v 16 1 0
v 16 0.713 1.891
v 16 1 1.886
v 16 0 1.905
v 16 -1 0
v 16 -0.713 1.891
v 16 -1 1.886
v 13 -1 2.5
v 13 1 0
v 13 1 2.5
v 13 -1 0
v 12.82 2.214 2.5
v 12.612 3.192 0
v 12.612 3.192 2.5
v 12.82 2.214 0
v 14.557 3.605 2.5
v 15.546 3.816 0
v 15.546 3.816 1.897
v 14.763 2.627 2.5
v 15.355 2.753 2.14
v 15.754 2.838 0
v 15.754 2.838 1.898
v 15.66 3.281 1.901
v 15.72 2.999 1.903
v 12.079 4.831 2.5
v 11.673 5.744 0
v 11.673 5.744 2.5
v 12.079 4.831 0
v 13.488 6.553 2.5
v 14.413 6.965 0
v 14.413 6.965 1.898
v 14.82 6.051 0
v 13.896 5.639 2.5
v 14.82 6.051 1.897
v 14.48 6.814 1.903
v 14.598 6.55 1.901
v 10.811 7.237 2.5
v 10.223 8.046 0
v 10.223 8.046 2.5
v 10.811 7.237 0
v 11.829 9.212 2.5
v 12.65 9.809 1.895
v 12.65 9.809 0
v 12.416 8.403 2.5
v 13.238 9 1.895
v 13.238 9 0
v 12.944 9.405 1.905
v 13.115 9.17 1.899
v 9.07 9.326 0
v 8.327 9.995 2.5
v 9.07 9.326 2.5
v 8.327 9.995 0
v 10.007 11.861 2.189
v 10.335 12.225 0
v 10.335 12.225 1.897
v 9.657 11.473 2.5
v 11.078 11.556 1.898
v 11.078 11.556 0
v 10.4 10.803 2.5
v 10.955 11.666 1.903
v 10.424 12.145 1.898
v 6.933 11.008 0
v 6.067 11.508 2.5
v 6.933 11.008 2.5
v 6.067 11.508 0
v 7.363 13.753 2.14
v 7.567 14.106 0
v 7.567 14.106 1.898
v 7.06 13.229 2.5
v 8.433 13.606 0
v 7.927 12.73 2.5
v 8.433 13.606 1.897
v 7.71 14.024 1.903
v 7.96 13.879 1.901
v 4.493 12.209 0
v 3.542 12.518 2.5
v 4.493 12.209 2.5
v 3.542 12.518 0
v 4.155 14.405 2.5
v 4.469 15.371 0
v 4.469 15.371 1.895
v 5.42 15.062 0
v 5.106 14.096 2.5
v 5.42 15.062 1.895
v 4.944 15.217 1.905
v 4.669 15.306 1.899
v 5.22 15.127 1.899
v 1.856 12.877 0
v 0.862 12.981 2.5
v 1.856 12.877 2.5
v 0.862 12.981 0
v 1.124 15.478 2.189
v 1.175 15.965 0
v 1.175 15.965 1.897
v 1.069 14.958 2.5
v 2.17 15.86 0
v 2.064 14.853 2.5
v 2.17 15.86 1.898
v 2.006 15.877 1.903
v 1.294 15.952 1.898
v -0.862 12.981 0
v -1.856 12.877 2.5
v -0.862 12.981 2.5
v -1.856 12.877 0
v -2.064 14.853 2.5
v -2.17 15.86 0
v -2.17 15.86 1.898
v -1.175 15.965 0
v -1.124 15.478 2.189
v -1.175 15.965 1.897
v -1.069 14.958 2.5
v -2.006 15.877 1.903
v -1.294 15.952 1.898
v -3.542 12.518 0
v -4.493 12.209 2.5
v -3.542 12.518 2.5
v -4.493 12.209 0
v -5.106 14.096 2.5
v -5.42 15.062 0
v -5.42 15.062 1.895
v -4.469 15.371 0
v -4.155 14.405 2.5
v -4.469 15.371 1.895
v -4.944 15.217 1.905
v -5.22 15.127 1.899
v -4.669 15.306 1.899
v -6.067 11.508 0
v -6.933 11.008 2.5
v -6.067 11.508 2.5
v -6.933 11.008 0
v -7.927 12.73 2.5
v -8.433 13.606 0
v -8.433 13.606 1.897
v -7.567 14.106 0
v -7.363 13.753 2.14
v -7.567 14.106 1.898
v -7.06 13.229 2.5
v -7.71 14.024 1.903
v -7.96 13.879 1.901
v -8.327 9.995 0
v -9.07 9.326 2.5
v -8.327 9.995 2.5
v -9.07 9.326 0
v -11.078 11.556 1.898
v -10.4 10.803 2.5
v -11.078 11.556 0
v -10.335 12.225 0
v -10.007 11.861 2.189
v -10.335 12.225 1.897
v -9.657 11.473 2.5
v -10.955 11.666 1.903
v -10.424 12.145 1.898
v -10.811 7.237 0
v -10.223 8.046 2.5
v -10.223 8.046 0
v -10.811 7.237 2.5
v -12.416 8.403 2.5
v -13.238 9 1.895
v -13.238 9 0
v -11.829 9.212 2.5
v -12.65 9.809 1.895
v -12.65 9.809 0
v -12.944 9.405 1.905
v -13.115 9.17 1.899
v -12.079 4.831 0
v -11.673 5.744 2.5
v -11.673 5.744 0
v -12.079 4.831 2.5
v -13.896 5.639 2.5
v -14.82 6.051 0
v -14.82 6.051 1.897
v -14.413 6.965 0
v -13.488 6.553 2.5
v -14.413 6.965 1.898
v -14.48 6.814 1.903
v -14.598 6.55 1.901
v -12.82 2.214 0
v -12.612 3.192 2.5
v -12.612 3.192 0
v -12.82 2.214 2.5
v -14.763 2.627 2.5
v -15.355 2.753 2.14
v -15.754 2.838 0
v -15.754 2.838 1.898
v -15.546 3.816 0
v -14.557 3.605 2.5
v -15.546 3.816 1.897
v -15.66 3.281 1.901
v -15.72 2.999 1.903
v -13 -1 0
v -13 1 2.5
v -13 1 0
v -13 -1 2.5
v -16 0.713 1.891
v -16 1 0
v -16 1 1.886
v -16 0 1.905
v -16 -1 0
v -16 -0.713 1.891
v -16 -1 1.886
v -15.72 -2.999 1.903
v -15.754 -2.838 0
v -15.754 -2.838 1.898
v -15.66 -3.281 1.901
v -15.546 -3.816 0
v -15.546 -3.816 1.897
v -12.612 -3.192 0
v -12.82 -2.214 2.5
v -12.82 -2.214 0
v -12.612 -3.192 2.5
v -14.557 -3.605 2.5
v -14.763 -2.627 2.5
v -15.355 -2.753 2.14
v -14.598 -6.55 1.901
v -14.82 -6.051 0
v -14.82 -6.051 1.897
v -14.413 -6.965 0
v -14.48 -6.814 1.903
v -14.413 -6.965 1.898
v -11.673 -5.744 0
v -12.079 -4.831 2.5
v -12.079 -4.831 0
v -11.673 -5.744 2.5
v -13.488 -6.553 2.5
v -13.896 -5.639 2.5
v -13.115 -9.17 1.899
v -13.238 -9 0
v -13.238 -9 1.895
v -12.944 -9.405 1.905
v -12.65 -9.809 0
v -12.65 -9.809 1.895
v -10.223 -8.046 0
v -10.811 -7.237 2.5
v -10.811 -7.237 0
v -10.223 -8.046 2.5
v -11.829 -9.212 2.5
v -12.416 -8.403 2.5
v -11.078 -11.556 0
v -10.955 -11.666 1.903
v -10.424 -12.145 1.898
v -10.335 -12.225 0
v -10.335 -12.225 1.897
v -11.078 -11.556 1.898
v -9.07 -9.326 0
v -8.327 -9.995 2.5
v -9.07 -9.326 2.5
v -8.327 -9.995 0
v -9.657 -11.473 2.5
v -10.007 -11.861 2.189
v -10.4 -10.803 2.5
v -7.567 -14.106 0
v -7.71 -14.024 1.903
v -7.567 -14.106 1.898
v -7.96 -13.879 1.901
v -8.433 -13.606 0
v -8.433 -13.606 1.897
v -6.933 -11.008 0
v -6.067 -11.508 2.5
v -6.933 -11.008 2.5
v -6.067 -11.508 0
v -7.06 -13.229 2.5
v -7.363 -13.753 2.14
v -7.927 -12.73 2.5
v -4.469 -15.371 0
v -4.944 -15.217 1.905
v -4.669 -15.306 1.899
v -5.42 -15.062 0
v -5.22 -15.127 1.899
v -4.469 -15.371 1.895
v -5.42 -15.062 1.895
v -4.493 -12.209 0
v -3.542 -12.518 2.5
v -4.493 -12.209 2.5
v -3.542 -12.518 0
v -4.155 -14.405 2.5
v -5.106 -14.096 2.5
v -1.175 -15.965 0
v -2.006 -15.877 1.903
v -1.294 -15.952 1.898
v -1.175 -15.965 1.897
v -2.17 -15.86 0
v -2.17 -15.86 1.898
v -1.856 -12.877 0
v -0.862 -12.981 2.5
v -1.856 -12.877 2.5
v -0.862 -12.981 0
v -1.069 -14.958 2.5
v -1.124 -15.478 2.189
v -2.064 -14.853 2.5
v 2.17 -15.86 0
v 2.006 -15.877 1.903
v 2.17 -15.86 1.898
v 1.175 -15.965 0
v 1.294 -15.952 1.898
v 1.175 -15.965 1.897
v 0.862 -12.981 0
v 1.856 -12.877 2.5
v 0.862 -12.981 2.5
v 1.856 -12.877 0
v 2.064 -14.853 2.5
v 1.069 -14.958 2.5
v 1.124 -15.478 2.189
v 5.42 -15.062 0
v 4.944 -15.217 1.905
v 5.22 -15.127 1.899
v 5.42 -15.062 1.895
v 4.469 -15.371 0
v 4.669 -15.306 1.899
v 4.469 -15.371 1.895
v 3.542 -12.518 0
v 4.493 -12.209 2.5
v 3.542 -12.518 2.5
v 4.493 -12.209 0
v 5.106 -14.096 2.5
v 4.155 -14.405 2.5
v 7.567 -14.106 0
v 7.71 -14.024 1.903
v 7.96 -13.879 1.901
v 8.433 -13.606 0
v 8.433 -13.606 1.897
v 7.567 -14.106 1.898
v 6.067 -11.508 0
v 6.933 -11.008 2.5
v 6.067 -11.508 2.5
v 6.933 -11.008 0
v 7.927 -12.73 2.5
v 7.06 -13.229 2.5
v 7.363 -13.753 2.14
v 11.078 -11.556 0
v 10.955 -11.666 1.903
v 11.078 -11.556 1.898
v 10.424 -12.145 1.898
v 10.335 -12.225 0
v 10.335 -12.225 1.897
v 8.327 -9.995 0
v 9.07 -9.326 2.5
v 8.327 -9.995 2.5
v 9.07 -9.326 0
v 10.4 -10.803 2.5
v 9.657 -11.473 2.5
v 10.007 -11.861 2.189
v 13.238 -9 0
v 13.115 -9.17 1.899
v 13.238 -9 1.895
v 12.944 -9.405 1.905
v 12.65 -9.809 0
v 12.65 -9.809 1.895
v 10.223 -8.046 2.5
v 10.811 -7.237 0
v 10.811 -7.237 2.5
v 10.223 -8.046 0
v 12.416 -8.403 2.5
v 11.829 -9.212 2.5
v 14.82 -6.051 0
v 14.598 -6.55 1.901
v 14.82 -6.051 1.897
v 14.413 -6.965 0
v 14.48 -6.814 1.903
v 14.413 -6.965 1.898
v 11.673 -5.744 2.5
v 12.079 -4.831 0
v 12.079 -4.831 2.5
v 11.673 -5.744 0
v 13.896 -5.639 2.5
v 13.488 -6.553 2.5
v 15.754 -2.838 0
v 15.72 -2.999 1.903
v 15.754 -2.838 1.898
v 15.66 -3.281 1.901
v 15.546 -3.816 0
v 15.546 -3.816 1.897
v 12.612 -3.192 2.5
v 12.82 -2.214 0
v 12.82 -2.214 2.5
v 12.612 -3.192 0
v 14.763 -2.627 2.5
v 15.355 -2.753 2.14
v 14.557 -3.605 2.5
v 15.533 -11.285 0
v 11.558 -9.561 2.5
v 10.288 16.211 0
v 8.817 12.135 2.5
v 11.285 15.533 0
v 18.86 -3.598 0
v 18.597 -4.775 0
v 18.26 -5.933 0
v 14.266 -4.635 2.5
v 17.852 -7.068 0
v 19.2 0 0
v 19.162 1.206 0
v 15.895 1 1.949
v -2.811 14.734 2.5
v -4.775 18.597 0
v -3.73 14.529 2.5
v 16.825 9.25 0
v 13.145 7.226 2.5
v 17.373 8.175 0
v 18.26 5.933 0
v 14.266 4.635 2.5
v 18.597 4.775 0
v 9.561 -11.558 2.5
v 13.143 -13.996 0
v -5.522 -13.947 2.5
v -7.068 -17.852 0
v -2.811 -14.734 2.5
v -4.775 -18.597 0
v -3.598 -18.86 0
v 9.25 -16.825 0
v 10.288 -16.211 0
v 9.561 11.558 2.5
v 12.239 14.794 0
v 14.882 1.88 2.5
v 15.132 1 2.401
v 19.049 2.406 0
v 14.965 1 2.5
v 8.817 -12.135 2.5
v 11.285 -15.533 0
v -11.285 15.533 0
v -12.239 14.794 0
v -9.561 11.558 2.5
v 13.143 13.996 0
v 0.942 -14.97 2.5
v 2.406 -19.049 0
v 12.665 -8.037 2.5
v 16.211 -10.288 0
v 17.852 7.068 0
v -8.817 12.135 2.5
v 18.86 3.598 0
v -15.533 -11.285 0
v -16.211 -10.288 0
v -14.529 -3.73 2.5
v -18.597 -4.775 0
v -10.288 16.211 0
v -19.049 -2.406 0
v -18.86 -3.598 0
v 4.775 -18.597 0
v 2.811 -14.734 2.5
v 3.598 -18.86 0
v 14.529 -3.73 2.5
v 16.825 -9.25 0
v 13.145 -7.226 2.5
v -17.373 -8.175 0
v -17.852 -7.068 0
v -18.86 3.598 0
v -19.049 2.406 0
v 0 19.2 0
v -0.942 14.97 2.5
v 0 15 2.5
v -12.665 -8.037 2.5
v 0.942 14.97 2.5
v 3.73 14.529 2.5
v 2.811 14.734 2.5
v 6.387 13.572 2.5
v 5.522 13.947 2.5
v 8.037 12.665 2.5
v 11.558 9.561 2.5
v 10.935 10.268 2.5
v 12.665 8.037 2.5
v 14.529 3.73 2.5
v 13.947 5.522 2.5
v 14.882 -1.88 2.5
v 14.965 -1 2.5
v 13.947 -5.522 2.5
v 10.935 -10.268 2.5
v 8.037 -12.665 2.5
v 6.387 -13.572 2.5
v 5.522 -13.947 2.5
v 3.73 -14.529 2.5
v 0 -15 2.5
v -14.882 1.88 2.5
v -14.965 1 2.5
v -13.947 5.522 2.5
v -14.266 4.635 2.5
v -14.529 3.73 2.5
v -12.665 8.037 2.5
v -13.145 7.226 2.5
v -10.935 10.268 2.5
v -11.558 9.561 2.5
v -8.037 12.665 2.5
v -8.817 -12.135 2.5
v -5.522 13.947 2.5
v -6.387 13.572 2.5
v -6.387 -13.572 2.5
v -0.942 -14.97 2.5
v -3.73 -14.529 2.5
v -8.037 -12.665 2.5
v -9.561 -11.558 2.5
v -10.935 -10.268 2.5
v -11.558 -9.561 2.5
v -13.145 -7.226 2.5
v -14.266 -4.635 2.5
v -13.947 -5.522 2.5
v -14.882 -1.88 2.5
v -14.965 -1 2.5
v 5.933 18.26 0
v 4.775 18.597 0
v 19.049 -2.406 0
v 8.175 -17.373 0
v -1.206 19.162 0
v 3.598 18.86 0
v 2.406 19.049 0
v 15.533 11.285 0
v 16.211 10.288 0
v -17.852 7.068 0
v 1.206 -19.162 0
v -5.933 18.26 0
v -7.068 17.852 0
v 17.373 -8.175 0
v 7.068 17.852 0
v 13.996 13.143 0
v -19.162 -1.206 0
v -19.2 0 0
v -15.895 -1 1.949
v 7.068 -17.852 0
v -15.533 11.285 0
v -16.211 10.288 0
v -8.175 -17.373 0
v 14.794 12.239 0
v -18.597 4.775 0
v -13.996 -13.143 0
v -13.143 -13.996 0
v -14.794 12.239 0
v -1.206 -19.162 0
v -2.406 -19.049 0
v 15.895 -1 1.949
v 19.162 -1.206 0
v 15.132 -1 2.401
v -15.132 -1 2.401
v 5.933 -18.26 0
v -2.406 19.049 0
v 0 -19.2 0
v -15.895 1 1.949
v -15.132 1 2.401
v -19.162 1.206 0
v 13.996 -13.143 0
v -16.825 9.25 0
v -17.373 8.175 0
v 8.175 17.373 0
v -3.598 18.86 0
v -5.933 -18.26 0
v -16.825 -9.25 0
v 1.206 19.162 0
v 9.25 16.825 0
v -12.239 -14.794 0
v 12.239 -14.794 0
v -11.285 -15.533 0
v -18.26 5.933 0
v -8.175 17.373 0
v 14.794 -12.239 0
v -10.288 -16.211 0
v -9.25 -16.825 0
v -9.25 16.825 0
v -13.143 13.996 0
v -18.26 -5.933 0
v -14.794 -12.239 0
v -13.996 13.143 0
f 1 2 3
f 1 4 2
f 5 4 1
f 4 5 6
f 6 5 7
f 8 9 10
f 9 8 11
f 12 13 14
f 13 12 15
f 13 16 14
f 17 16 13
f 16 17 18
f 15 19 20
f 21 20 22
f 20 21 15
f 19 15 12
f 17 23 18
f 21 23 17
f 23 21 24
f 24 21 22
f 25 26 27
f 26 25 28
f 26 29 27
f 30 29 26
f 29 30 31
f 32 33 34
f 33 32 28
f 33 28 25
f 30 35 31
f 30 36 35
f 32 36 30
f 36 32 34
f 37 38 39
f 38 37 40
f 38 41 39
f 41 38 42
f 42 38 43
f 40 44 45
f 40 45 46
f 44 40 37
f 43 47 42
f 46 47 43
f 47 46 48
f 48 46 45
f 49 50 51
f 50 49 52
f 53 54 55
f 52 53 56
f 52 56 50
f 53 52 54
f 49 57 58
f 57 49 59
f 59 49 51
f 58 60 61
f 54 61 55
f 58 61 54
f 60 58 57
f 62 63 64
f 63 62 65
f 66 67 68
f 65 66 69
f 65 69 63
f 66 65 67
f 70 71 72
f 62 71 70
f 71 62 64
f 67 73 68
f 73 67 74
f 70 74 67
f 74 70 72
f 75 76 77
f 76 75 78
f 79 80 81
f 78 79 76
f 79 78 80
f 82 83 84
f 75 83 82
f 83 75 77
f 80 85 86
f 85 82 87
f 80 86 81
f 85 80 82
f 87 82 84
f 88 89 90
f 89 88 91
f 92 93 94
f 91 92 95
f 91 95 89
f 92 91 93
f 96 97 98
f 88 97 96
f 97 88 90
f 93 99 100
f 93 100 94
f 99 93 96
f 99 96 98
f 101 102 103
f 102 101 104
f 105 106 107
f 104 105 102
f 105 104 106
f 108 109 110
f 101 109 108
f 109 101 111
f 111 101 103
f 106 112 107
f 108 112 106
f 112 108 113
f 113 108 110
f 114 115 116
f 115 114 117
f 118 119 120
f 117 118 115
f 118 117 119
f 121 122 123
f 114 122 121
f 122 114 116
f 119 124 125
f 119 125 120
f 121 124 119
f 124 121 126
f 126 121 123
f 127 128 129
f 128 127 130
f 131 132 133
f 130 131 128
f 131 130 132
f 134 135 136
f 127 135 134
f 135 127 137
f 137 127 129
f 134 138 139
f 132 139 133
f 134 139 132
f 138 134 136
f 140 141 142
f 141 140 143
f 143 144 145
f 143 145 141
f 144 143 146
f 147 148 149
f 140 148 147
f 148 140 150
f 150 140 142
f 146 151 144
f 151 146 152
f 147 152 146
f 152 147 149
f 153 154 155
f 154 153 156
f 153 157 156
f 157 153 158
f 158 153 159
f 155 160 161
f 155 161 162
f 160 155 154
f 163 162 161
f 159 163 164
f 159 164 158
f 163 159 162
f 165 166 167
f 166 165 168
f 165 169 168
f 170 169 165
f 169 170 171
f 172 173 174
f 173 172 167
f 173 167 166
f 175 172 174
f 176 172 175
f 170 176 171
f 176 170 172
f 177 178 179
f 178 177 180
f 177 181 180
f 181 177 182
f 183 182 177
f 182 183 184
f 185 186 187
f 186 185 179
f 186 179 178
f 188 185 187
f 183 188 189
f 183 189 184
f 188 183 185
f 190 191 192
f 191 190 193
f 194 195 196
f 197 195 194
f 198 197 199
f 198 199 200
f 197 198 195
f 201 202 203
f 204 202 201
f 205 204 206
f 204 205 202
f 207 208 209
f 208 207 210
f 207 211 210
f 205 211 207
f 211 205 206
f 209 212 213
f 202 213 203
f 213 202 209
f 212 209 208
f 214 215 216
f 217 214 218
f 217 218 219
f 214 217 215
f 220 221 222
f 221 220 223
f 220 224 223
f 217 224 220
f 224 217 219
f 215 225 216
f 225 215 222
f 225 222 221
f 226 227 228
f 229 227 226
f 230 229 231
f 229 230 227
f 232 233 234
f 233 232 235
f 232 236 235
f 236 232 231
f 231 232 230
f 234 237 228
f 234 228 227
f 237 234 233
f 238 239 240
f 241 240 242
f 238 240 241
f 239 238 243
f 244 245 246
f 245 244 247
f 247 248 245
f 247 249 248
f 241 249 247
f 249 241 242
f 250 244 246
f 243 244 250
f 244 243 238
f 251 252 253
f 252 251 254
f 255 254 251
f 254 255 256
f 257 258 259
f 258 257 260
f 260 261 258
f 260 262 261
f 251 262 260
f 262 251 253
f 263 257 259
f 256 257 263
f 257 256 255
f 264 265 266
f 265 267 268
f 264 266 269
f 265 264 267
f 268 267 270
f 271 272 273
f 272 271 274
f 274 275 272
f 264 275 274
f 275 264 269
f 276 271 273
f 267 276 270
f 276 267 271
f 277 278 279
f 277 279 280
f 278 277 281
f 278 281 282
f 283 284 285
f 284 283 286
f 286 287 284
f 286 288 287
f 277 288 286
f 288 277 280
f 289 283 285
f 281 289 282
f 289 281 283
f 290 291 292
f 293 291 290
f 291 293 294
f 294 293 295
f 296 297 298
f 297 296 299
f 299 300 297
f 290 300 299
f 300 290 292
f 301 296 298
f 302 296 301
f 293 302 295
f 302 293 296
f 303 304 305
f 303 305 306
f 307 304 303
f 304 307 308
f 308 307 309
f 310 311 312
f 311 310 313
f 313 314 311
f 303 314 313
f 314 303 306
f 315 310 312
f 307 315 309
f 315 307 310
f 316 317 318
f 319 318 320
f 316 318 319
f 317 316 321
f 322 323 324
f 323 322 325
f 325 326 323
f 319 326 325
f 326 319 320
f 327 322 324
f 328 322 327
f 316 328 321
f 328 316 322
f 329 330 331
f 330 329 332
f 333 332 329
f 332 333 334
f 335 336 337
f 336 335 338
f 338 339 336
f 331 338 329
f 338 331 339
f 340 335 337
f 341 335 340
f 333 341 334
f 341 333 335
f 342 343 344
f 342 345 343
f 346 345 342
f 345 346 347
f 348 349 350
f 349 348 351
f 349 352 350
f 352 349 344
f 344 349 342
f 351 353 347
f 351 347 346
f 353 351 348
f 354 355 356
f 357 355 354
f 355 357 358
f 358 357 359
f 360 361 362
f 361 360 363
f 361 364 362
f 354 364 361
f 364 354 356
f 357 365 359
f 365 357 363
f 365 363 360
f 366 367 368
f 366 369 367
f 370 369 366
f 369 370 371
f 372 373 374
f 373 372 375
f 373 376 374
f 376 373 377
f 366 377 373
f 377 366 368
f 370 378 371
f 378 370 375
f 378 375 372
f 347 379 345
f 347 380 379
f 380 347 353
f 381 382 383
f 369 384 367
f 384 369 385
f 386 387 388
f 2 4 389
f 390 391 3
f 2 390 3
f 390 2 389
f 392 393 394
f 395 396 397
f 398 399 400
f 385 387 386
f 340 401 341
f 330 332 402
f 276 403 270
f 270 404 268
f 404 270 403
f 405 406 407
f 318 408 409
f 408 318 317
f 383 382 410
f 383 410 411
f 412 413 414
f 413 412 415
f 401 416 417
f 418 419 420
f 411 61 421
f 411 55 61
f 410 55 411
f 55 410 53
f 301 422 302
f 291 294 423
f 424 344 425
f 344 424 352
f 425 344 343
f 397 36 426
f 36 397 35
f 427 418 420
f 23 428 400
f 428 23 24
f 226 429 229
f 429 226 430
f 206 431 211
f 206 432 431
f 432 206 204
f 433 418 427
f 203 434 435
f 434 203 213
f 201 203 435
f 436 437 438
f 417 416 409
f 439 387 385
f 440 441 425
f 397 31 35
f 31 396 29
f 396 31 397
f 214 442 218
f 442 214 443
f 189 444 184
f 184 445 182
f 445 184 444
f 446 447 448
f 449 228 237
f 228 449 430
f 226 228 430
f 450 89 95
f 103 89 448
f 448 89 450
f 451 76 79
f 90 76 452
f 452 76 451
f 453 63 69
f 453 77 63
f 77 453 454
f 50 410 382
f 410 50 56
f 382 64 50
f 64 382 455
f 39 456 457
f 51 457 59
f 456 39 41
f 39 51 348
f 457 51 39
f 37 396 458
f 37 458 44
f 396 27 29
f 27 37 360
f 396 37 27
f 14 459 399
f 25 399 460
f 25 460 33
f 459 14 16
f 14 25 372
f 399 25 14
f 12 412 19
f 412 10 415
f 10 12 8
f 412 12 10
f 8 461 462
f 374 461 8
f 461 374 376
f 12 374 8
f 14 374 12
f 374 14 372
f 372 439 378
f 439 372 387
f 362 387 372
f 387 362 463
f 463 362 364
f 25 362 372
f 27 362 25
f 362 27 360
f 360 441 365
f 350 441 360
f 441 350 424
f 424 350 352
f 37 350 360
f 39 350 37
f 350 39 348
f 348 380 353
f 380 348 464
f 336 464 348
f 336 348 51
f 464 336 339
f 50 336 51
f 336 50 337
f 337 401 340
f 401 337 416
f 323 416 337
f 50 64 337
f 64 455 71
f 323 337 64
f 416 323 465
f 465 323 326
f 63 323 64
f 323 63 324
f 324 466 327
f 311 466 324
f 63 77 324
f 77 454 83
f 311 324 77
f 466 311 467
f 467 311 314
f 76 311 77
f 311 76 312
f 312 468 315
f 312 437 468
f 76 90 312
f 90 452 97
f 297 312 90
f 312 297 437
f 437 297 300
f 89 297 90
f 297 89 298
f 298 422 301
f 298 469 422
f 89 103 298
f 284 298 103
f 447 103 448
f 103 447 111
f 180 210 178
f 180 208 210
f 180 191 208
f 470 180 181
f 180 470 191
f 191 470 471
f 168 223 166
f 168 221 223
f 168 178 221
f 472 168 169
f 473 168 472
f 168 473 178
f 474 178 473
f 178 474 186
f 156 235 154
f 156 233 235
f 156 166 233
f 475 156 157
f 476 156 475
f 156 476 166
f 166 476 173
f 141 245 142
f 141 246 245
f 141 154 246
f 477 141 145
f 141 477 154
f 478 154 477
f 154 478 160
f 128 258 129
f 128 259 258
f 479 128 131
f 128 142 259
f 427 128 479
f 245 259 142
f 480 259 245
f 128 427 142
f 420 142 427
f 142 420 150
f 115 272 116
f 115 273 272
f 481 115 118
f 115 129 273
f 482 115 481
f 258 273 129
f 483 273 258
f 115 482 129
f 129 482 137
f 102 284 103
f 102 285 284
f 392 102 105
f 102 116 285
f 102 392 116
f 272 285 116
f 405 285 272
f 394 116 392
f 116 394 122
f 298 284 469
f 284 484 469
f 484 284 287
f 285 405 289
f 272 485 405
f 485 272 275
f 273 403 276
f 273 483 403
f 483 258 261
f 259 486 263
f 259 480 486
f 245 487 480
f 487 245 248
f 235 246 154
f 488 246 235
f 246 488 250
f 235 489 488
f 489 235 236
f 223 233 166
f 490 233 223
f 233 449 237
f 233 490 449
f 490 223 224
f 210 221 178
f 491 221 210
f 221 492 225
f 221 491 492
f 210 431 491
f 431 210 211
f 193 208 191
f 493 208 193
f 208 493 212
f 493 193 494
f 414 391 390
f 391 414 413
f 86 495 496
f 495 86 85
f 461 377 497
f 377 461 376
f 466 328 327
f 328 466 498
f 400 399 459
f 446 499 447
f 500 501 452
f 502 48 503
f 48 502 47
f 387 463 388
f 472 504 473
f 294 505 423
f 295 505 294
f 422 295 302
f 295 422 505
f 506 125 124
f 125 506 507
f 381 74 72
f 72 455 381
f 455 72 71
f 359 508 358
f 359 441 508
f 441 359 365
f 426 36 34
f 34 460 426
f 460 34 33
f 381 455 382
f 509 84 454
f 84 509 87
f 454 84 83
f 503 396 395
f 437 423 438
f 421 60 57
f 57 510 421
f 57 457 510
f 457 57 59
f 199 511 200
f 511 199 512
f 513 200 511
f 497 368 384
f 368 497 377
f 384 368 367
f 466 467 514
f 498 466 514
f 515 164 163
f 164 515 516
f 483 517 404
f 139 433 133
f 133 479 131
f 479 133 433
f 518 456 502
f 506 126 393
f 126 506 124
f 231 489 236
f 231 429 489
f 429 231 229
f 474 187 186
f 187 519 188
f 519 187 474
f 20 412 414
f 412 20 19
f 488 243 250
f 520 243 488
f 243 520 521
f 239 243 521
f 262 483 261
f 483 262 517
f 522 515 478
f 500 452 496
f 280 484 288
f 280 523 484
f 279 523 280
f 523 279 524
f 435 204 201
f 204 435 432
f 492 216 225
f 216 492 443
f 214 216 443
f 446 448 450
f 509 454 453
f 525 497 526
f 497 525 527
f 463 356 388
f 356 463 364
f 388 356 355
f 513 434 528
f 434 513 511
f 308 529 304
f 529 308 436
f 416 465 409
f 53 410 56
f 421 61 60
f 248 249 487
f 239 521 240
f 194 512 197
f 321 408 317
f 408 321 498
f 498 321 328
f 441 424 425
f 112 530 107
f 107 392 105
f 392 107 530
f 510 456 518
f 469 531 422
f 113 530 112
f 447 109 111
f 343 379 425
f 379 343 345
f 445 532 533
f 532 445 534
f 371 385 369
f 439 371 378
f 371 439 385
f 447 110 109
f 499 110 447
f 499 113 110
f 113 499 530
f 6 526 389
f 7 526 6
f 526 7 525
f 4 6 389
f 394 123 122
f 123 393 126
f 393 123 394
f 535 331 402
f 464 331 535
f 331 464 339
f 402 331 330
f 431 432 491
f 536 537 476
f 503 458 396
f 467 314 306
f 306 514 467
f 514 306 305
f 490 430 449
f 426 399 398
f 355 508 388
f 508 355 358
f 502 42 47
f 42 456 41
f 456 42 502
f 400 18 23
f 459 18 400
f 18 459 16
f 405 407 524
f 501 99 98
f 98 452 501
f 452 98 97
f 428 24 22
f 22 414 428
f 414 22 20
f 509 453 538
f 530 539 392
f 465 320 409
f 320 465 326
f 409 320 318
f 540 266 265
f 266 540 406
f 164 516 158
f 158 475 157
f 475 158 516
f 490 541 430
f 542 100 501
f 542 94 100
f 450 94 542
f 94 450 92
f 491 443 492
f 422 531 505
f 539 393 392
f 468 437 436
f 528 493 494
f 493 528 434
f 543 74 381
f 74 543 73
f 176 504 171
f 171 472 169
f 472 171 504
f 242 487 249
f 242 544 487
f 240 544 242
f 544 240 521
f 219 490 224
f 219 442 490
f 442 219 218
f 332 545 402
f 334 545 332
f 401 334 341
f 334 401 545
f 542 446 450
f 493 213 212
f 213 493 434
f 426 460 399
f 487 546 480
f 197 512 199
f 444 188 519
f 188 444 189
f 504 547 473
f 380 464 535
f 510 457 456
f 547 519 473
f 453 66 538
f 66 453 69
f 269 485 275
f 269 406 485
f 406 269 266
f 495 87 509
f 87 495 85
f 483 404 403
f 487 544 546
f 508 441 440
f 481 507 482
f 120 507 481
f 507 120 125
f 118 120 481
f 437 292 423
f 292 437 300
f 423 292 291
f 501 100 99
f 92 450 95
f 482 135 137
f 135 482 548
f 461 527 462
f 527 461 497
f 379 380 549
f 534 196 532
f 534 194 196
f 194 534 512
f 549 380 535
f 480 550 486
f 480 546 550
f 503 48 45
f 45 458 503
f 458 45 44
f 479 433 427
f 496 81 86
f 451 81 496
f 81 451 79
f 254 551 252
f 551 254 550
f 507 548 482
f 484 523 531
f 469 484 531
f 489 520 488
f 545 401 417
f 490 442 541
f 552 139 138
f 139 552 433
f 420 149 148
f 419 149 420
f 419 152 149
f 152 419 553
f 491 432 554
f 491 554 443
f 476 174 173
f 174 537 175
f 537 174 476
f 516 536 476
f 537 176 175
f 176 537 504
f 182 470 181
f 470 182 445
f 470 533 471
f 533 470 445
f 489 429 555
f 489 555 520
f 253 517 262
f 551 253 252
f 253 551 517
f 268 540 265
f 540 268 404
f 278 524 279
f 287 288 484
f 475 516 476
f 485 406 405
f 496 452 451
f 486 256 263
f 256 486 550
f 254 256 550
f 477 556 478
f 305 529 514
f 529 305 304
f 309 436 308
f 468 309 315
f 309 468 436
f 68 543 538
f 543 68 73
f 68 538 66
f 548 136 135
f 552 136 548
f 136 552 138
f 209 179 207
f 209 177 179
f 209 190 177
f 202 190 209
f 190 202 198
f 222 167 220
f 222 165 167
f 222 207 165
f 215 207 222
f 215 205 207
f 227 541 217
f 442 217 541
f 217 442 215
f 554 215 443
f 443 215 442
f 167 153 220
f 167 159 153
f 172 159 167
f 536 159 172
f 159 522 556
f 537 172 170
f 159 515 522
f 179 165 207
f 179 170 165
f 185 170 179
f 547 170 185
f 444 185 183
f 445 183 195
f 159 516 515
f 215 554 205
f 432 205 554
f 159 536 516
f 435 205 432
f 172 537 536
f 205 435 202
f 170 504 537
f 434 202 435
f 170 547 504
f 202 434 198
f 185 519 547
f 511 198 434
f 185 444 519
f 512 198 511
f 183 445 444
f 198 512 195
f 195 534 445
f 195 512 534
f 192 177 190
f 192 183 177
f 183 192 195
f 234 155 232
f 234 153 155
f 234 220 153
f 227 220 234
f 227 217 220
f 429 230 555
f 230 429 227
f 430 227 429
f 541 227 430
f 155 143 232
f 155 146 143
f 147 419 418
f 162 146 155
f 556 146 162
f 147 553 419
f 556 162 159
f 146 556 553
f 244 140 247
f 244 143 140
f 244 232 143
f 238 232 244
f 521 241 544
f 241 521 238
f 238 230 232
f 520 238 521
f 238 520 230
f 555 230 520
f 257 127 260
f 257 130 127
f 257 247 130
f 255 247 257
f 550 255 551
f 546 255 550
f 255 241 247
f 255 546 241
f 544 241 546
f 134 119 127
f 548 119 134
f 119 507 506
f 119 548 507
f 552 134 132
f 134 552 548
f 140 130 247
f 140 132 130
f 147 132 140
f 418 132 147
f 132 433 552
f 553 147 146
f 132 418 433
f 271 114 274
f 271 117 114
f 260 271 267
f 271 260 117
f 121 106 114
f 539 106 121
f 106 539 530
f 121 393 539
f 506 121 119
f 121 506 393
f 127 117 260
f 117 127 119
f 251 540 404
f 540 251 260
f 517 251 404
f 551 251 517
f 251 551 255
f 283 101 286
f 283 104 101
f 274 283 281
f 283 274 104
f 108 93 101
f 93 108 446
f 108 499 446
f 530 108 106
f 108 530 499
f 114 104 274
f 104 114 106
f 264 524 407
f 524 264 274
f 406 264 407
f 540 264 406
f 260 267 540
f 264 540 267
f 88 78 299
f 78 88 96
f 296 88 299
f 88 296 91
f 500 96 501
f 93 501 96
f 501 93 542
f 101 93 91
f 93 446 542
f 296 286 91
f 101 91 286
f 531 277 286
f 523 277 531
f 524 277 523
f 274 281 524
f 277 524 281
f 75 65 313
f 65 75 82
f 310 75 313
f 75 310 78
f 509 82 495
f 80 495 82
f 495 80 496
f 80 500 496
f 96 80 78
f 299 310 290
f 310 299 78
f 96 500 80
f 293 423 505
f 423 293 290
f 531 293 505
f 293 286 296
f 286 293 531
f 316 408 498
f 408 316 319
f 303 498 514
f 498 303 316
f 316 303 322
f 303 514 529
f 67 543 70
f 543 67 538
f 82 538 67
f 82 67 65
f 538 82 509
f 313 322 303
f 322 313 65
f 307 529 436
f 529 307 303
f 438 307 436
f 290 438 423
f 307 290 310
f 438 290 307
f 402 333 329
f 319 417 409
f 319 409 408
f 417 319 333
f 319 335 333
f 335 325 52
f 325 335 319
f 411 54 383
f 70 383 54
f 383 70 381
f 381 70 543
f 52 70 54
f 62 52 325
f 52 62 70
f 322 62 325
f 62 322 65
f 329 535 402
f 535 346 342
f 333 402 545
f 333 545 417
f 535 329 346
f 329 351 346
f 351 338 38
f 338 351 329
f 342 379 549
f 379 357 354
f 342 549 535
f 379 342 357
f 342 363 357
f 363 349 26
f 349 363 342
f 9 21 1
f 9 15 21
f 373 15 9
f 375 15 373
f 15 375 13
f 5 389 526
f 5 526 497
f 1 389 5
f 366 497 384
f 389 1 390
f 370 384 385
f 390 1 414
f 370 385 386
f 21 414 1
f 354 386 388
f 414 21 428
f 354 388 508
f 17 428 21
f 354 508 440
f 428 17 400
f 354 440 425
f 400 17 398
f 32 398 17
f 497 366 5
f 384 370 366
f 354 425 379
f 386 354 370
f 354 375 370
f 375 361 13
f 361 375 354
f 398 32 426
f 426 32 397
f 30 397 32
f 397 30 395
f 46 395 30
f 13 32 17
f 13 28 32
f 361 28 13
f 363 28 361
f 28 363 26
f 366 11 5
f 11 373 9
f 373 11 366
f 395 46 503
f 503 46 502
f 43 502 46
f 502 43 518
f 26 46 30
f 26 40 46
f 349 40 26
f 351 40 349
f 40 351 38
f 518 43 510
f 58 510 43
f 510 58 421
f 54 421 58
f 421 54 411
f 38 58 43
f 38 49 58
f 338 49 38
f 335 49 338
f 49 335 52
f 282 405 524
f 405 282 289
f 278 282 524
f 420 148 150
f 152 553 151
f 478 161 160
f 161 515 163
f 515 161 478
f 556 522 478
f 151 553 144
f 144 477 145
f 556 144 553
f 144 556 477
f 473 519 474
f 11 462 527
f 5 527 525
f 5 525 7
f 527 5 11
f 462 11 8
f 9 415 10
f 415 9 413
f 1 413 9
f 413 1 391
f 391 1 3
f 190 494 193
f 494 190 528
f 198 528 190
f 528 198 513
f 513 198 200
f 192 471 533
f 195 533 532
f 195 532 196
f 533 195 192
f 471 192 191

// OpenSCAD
th_in=1.5;
th_out=1.5;

s_w=1;
s_n=15;

p_w=0.8;

$fn=100;

module support_diff(d1=30,d2=28,d3=38,d4=40,h1=20,h2=25){
    ds_in_max=d1+(th_in*2);
    ds_in_min=d2+(th_in*2);
    hs_in=h2+th_out;
    ds_out_max=d4-(th_out*2);
    ds_out_min=d3-(th_out*2);
    hs_out=h2;
    union(){
    difference(){
        cylinder(r1=ds_out_max/2, r2=ds_out_min/2, h=hs_out);
        translate([0,0,(hs_out-hs_in)/2])cylinder(r1=ds_in_max/2, r2=ds_in_min/2, h=hs_in);
        for(ang=[0:360/(s_n*2):360]){
            rotate([0,0,ang])translate([(d2/2)-1,-s_w/2,-1])cube([20,s_w,h2+2]);
        }
        translate([-d4,-s_w,0])cube([d4*2,s_w*2,hs_out]);
}
}
}

module stand(d1=30,d2=28,d3=38,d4=40,h1=20,h2=25, ss_w=1){
    difference(){
        translate([0,0,0])cylinder(r1=d4/2-p_w, r2=d1/2, h=(h2-h1)/2);
        for(ang=[0:360/(s_n*2):360]){
            rotate([0,0,ang])translate([(d2/2)-1,-ss_w/2,-1])cube([3,ss_w,h2+2]);
        }
        translate([(d2/2)-1,-ss_w,-1])cube([3,ss_w,h2+2]);
        translate([(d2/2)-1,0,-1])cube([3,ss_w,h2+2]);
        translate([-(d2/2+3)+1,-ss_w,-1])cube([3,ss_w,h2+2]);
        translate([-(d2/2+3)+1,0,-1])cube([3,ss_w,h2+2]);
    }
    }


module spool_backing(d1=30,d2=28,d3=38,d4=40,h1=20,h2=25, support=true, stand=false){
    h_delta=(h2-h1)/2;
    difference(){
        cylinder(r1=d4/2, r2=d3/2, h=h2);
        translate([0,0,h_delta])cylinder(r1=d1/2, r2=d2/2, h=h1);
        translate([0,0,h1+h_delta])cylinder(r1=d2/2, r2=d3/2-p_w, h=(h2-h1)/2);
        
        if(support){
            support_diff(d1=d1,d2=d2,d3=d3,d4=d4,h1=h1,h2=h2);
        }
        translate([-d4,-d4,-1])cube([d4*2,d4,h2*2]);
    if(stand){
        //for(st_a=[5:34:175]){
        //    rotate([0,0,st_a])translate([d1/2,-p_w/2,0])cube([(d4-d1)/2-p_w,p_w,1]);
        //}
        stand(d1=d1,d2=d2,d3=d3,d4=d4,h1=h1,h2=h2);
    }else{
        translate([0,0,0])cylinder(r1=d4/2-p_w, r2=d1/2, h=(h2-h1)/2);
        //support();
    }
}
}

//spool_backing(stand=true);
stand();
